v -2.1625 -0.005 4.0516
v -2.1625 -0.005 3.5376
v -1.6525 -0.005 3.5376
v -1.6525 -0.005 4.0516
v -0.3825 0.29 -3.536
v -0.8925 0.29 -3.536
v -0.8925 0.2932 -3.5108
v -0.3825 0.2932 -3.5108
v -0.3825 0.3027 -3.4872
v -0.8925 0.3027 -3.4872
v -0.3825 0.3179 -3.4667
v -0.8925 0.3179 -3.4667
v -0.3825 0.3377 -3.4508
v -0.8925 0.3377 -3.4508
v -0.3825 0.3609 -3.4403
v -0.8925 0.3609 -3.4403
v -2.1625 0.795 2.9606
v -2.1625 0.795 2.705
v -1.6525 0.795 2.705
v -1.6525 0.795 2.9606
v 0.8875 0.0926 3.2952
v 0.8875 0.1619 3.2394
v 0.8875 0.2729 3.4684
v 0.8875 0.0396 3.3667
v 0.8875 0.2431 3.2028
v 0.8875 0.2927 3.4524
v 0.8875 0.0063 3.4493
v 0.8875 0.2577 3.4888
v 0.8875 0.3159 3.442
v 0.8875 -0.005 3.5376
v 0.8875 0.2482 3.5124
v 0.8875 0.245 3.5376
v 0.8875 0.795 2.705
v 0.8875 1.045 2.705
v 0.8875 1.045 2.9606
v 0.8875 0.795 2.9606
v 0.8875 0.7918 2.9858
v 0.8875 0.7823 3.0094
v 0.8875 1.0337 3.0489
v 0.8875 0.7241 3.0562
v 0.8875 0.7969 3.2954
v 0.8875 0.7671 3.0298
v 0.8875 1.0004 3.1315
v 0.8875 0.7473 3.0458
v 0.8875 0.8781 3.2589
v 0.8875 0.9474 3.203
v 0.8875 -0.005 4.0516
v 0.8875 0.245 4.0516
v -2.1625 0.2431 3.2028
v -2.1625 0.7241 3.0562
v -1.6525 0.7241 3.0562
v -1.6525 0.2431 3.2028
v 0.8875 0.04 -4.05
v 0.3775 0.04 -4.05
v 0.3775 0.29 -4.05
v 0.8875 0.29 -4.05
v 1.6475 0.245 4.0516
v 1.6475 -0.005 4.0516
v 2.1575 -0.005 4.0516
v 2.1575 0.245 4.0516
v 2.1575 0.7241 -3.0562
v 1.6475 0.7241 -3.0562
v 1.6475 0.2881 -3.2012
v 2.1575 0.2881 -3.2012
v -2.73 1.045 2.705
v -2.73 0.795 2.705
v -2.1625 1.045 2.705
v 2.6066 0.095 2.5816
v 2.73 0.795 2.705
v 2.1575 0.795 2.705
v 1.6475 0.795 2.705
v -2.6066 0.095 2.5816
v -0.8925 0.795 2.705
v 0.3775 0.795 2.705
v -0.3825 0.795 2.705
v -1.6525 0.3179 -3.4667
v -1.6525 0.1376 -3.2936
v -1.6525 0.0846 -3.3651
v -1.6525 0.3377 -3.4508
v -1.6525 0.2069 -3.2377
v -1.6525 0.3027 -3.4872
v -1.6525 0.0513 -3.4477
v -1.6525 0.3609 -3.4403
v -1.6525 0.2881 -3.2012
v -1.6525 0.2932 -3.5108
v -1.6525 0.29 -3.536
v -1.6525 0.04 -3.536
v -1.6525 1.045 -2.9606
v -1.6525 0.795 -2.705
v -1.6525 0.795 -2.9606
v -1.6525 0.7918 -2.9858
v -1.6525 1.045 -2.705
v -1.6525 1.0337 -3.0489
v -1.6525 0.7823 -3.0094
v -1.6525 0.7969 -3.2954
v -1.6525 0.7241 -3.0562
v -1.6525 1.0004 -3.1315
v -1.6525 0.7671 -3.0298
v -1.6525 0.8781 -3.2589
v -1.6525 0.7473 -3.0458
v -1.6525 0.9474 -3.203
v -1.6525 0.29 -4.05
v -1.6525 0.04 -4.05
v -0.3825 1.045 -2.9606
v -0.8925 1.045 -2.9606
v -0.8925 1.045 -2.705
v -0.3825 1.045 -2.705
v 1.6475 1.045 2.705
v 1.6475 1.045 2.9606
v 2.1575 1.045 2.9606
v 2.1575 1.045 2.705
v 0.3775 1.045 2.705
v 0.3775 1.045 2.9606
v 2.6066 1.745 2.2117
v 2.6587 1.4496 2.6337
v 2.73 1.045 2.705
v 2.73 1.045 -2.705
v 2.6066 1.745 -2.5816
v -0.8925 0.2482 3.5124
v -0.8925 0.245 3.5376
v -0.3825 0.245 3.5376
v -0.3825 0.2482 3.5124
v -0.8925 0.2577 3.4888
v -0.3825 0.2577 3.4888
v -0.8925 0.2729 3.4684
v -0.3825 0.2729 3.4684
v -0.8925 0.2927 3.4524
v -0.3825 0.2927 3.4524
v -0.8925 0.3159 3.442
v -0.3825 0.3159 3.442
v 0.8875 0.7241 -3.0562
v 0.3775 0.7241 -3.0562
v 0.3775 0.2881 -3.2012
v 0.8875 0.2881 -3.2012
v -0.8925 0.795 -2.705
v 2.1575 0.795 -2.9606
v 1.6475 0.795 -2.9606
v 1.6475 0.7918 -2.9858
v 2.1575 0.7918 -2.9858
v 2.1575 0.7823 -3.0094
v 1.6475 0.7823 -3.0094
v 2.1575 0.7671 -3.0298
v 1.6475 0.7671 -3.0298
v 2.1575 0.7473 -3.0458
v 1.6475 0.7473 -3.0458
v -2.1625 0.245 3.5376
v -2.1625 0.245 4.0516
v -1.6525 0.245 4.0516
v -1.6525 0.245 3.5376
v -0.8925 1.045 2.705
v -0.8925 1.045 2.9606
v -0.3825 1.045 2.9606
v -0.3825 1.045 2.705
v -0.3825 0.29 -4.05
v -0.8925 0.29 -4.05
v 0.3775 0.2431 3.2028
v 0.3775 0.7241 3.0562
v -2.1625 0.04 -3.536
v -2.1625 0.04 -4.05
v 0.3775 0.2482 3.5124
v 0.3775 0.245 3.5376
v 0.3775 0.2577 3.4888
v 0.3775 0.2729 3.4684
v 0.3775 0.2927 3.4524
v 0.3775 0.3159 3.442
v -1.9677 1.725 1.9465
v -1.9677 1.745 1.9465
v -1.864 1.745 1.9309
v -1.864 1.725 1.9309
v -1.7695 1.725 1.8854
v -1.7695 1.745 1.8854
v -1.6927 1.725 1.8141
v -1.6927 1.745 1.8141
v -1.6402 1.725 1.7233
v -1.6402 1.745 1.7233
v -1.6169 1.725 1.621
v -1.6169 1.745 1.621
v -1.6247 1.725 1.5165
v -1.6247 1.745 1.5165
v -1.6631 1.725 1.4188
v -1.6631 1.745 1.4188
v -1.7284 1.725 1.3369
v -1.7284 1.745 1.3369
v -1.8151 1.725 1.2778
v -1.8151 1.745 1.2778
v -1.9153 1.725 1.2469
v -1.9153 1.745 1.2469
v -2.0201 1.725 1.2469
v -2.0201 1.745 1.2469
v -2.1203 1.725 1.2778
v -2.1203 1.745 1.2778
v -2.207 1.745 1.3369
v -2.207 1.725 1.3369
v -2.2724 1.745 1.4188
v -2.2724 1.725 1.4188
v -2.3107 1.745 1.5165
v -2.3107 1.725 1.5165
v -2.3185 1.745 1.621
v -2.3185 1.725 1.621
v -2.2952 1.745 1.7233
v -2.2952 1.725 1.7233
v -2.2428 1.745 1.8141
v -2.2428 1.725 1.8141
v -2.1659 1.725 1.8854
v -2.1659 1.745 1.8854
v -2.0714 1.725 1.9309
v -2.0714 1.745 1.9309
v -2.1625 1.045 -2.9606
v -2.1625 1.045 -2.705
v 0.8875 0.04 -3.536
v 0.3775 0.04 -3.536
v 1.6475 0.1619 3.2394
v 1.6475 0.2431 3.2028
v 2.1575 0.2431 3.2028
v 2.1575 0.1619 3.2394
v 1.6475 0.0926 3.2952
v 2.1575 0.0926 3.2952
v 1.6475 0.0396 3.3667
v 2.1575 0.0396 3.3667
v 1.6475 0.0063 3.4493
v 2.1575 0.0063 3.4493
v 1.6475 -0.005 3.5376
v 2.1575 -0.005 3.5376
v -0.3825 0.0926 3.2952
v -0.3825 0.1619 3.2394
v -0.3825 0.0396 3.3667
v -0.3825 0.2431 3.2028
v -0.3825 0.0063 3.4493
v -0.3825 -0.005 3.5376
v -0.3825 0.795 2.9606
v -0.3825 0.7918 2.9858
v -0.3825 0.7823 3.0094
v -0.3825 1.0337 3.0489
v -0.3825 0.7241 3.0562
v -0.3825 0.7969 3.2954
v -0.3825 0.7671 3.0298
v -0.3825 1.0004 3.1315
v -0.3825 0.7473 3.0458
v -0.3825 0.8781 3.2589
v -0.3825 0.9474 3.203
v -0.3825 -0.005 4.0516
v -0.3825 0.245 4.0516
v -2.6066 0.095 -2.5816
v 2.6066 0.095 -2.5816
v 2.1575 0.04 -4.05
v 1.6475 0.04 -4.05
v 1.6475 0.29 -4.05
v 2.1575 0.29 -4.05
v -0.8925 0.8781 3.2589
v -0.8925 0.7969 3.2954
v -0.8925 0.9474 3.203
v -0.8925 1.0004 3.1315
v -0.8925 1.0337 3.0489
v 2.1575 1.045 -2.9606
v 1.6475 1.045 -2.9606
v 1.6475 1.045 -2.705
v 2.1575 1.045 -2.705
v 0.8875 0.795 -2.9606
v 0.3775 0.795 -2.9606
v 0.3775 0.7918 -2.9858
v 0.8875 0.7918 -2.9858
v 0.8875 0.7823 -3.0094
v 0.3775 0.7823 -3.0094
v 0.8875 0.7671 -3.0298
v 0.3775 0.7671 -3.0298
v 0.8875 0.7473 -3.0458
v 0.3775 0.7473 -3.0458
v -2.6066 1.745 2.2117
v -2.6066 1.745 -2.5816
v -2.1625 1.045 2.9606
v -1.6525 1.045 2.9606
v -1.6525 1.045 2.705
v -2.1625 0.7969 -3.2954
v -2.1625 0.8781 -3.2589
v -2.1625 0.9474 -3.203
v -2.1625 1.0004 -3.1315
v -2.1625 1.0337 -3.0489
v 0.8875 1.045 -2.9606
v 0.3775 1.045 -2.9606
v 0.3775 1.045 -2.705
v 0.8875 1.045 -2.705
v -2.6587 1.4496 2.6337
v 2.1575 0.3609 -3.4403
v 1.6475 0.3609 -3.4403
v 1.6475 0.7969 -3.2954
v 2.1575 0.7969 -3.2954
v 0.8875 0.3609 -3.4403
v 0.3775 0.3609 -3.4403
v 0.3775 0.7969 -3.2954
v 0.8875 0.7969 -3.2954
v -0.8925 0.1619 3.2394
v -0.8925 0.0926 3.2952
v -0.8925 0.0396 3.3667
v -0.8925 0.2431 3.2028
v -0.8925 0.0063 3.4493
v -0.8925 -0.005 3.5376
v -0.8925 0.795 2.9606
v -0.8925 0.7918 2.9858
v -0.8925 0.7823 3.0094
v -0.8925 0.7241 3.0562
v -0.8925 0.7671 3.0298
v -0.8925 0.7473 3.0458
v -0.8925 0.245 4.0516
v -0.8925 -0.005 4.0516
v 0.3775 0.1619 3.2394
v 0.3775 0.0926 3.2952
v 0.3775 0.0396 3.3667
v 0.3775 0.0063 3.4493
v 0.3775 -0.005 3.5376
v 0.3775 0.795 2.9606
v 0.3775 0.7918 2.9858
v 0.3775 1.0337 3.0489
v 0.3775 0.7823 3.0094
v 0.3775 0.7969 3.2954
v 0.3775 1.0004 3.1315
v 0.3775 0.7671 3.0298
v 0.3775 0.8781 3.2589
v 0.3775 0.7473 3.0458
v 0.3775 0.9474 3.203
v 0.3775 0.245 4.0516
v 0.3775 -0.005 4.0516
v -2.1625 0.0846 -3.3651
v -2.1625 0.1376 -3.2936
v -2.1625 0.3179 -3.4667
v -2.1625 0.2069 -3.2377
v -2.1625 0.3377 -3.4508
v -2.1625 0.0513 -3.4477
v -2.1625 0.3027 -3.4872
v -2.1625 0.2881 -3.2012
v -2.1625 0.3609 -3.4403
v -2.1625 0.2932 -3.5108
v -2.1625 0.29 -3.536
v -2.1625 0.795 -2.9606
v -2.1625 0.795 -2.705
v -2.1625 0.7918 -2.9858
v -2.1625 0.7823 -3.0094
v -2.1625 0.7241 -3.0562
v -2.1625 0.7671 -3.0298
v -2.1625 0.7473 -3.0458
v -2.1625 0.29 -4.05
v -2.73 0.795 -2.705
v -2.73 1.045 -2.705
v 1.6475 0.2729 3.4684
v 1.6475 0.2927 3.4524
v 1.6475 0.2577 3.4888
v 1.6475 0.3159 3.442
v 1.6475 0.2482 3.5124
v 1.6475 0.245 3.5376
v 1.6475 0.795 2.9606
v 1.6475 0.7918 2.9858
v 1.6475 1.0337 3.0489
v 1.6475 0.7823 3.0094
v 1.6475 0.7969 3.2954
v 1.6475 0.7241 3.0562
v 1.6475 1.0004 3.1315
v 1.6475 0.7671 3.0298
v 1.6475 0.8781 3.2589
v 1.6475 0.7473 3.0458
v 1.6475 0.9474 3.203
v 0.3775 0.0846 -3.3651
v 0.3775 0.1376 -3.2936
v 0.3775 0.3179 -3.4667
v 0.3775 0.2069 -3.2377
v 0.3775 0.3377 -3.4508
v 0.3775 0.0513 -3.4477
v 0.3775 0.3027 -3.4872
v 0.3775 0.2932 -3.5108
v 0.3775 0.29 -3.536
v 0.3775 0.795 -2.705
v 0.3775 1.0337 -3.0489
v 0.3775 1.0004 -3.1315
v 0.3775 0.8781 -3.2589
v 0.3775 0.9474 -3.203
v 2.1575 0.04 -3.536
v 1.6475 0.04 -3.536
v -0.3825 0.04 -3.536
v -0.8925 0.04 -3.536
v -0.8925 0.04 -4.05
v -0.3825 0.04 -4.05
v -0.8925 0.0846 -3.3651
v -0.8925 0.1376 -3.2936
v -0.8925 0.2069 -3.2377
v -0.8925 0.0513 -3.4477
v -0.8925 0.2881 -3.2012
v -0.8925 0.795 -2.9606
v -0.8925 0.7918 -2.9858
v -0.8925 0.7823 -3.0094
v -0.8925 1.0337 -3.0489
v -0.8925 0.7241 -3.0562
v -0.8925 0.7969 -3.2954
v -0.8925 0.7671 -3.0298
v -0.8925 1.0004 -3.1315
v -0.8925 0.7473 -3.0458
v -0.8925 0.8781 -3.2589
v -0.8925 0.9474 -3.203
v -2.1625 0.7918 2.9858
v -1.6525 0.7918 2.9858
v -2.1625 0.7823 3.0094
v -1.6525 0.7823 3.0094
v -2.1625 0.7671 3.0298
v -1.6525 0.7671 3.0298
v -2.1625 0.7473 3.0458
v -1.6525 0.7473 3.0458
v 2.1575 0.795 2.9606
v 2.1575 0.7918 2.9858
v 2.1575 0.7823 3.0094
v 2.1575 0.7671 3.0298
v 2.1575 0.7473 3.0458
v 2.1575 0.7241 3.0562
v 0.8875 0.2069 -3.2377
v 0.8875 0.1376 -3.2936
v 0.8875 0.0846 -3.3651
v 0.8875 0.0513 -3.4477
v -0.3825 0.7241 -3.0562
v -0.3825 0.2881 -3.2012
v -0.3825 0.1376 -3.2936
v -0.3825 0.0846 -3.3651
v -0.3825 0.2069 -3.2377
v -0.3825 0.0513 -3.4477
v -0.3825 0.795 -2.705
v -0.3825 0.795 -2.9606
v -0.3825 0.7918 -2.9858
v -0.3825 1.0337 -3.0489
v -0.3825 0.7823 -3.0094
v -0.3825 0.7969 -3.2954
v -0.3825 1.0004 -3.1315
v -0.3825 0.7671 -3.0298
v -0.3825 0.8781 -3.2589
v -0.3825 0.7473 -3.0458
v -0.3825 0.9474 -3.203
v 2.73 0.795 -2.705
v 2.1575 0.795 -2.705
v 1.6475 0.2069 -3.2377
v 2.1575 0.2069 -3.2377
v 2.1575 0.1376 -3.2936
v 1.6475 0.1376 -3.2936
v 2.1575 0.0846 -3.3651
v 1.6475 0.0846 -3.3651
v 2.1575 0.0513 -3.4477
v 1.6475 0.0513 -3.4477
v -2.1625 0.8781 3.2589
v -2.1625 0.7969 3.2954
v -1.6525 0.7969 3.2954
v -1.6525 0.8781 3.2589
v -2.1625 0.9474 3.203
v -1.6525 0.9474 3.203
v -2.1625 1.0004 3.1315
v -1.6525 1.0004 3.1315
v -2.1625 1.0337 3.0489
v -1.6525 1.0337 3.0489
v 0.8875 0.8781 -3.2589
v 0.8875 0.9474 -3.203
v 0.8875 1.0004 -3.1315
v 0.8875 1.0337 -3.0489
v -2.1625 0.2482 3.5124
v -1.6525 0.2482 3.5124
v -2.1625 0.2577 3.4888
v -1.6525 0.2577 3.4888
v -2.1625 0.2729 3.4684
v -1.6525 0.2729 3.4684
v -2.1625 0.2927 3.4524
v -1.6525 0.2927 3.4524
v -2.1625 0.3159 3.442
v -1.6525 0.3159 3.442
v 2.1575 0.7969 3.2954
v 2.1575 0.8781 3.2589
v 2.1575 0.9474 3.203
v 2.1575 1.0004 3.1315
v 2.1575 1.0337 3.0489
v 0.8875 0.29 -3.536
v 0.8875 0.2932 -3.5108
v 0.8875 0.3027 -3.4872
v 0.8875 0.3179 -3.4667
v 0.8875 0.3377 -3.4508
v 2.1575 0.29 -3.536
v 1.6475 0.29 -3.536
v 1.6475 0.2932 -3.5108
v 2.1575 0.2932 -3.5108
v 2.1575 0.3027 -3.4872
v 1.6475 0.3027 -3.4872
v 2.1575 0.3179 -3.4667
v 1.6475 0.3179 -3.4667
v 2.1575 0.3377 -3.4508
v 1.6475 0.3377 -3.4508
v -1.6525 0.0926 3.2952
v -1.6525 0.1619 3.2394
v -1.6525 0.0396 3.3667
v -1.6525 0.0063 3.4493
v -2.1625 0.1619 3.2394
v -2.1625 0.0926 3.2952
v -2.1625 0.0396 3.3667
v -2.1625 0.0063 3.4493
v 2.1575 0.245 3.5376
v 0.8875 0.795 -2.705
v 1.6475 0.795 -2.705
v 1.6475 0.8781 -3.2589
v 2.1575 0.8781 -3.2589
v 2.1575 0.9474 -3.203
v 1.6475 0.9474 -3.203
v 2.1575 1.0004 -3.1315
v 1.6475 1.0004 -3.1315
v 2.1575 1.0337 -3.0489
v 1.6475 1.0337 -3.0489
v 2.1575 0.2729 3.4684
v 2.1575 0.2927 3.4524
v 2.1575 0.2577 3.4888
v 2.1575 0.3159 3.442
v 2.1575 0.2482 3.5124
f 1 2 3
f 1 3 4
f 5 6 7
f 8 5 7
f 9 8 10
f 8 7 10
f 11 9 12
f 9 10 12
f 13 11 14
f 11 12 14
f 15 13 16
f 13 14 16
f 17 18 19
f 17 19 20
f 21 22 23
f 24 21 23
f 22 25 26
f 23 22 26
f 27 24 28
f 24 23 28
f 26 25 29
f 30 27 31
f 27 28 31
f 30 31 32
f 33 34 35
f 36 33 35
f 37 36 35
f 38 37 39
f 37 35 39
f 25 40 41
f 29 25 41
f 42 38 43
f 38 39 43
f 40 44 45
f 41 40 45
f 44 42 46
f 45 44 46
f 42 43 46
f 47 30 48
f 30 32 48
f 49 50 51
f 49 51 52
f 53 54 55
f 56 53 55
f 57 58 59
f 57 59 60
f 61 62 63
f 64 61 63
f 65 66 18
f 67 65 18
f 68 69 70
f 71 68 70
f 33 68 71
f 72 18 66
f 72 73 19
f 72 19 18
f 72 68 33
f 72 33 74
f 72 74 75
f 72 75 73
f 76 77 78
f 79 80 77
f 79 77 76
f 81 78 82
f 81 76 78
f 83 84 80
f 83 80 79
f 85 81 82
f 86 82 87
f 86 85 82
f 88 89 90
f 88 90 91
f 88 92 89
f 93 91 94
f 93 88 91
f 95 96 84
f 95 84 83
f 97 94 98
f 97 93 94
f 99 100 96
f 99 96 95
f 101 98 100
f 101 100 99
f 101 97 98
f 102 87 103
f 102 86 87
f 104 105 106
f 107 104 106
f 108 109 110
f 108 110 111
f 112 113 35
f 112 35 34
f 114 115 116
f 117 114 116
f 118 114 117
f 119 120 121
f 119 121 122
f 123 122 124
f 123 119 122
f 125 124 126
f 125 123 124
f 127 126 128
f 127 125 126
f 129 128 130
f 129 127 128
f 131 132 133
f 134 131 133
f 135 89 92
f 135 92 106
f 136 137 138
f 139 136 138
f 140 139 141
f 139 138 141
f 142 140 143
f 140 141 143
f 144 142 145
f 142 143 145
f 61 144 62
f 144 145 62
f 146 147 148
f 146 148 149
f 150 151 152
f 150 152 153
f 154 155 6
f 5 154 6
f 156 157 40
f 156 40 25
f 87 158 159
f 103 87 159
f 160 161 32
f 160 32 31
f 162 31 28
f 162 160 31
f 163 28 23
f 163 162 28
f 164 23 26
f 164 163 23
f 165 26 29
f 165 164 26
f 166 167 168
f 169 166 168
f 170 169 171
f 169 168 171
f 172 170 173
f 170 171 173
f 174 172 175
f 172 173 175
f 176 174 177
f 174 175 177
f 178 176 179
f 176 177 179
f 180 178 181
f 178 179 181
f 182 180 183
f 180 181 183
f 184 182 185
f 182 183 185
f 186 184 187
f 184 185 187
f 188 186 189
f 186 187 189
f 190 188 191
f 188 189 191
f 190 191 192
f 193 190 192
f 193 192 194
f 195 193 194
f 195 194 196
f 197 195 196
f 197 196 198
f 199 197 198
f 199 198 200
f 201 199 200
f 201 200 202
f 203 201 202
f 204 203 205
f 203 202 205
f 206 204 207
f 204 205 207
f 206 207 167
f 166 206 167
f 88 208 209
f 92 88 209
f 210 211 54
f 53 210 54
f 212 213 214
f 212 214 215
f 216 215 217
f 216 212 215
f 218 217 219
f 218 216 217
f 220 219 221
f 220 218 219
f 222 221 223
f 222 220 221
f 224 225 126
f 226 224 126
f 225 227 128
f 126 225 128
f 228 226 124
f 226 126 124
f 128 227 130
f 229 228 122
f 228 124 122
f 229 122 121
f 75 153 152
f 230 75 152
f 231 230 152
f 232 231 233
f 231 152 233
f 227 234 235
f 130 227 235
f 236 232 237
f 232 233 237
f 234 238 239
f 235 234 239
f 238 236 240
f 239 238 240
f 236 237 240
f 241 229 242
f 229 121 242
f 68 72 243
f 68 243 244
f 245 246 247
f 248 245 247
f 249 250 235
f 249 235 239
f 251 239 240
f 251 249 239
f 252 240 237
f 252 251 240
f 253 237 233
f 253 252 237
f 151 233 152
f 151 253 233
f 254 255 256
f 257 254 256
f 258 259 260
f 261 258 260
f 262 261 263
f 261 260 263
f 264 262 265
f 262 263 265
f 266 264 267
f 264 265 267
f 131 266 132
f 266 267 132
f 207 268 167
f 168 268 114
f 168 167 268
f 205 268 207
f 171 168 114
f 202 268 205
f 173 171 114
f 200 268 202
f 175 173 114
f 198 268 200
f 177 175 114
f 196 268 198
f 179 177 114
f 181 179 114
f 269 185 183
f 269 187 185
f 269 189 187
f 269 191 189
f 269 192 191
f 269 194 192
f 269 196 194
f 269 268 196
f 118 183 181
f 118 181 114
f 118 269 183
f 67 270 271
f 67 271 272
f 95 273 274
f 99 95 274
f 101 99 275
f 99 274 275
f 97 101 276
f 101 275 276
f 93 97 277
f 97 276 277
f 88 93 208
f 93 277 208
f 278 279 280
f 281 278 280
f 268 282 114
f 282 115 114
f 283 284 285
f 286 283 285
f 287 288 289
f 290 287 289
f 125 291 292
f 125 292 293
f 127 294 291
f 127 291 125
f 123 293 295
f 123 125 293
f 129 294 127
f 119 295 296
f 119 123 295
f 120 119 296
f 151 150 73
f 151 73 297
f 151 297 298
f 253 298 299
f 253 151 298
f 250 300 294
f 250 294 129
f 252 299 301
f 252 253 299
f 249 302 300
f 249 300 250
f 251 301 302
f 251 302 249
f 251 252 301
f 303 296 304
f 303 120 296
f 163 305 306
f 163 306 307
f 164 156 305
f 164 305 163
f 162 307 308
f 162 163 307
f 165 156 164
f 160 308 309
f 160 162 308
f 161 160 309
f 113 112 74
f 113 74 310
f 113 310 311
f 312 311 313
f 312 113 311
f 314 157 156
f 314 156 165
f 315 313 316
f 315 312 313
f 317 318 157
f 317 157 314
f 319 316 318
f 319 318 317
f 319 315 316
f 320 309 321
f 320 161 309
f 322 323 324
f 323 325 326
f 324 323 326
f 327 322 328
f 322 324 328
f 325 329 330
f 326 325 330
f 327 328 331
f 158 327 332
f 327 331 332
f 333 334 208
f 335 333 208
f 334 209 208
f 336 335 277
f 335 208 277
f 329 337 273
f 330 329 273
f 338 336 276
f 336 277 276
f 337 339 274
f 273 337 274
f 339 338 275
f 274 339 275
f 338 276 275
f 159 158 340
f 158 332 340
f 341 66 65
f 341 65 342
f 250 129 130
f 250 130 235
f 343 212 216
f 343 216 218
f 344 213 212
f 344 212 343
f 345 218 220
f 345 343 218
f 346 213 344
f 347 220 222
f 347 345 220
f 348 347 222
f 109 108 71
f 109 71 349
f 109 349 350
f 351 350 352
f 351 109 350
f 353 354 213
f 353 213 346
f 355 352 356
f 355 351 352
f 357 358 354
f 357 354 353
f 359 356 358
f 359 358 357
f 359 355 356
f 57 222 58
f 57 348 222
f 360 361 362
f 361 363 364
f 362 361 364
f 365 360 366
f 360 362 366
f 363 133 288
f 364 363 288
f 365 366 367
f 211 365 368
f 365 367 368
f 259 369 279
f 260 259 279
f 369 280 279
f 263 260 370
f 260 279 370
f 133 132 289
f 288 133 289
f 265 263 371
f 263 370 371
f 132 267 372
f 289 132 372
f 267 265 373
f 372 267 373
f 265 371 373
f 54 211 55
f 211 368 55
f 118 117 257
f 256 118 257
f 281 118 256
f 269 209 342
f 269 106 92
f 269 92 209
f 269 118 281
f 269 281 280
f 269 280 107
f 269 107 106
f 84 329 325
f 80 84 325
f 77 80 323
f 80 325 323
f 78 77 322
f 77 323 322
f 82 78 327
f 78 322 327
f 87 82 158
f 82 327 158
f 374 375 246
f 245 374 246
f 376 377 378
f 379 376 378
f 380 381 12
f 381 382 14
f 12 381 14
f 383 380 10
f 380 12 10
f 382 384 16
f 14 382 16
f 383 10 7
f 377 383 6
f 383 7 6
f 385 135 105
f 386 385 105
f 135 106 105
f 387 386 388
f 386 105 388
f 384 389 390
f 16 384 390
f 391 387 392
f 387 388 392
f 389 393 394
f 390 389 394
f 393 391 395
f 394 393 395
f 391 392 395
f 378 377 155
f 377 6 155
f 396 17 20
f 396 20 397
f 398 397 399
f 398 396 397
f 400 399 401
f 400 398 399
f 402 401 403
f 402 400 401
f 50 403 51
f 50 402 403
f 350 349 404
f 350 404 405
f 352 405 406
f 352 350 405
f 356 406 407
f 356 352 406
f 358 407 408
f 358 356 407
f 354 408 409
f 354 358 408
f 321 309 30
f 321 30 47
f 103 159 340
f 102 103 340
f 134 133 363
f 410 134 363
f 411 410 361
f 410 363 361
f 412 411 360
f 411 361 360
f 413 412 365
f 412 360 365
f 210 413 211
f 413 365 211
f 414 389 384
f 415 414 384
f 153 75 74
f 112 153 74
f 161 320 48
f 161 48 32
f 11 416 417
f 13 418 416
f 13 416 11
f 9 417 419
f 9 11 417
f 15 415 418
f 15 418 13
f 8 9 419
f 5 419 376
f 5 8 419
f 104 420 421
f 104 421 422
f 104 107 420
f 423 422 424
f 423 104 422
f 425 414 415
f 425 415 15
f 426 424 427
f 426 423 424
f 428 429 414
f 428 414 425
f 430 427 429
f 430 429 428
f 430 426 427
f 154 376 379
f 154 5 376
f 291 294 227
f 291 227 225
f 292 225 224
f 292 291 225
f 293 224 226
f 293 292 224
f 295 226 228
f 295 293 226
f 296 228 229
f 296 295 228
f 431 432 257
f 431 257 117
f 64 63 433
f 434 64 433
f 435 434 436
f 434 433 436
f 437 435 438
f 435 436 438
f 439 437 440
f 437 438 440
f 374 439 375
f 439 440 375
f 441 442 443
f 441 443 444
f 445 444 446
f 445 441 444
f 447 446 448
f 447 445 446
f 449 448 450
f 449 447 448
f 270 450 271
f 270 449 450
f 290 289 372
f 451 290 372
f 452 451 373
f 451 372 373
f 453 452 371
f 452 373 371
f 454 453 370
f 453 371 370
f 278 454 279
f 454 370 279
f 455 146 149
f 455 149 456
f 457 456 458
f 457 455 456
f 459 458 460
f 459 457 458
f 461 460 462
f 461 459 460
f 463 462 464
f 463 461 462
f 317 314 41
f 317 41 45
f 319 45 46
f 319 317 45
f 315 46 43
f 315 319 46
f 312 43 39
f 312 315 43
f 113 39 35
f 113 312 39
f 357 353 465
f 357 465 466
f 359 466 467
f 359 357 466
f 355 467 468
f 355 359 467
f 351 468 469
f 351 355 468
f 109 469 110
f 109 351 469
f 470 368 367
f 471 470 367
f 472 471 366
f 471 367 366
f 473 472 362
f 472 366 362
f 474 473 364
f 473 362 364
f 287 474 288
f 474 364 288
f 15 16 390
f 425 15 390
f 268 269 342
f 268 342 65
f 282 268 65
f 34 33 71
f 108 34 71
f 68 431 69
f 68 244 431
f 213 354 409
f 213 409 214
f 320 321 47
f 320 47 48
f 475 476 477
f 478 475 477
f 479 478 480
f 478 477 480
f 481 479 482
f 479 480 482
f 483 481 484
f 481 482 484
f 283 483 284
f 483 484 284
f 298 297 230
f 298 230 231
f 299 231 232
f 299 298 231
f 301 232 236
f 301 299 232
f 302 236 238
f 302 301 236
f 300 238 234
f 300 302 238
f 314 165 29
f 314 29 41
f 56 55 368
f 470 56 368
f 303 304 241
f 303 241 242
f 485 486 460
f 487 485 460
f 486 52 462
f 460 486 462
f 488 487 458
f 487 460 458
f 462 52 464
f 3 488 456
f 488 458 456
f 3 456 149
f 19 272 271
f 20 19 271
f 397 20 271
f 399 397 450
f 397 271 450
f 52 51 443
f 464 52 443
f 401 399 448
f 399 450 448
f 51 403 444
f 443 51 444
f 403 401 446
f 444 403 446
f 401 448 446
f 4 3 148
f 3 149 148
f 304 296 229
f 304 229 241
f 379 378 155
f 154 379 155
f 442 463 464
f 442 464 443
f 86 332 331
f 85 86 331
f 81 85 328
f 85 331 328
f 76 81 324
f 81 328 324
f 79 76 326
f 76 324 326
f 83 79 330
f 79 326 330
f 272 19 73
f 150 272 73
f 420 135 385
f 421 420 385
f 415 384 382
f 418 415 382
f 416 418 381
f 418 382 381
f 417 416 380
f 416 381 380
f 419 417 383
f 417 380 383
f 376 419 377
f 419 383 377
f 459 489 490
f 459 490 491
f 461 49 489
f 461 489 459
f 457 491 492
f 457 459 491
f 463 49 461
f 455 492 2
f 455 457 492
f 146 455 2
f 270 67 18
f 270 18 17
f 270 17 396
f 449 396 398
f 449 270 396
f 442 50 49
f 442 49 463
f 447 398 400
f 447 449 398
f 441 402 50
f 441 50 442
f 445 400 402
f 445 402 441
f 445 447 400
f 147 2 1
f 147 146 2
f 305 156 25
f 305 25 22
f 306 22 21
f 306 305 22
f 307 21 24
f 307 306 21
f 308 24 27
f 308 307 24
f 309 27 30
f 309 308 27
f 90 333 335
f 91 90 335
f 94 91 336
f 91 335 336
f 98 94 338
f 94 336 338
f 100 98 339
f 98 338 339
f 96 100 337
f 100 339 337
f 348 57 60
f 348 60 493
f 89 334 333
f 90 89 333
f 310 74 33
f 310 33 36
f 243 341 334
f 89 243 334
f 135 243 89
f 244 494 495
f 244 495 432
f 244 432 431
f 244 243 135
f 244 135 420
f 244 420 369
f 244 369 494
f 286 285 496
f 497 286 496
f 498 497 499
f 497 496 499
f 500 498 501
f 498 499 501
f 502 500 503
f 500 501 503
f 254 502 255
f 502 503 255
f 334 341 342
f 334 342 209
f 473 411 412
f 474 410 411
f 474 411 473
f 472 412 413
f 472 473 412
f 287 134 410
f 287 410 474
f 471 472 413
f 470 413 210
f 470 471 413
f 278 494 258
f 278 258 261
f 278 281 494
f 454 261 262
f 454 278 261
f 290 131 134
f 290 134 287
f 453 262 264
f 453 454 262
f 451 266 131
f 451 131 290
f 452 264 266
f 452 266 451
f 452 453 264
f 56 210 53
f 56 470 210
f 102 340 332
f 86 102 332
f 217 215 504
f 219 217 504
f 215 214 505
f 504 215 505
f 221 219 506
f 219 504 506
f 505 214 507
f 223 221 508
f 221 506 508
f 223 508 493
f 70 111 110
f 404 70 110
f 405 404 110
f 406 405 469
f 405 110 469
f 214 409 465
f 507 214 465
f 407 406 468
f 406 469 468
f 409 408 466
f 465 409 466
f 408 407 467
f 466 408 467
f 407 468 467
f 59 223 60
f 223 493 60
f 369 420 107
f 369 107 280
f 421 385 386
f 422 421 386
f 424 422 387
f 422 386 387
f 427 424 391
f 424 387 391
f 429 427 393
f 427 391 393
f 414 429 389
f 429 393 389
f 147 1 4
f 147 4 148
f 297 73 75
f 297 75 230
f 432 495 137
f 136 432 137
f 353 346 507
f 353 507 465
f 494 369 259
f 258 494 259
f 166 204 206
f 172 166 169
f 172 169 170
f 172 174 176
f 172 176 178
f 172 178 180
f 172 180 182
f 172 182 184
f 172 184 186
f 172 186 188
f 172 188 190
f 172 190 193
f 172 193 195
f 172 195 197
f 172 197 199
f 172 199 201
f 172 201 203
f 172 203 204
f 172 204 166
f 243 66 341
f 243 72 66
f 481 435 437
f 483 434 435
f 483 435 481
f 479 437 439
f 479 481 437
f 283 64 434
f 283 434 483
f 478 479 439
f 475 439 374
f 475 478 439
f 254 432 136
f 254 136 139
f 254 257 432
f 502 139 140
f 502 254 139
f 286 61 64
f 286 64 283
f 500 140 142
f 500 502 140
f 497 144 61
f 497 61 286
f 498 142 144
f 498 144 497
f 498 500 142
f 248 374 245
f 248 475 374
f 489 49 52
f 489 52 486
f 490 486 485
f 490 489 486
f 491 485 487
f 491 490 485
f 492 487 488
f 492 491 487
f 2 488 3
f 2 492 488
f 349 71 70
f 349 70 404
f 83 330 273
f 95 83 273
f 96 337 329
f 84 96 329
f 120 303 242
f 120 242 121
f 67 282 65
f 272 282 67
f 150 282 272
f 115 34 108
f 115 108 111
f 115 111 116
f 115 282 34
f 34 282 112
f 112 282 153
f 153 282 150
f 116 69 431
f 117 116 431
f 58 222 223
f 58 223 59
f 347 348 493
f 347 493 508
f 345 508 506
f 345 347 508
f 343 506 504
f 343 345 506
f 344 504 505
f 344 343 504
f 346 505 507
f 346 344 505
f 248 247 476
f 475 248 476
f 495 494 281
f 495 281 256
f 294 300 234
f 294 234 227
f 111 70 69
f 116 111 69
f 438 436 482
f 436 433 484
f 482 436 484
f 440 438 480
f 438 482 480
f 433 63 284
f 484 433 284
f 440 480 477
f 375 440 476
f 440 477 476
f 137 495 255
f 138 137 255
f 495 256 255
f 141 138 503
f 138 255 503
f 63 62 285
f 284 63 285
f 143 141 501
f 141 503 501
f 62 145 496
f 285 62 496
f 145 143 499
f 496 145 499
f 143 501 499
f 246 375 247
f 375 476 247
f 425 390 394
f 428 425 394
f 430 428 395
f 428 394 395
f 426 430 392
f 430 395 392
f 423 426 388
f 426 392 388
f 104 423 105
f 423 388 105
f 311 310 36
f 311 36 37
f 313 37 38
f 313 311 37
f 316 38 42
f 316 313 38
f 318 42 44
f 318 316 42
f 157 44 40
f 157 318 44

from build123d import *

# Parameters (mm, degrees)
BOSS_EXTRUDE1_DEPTH      = 0.125
BOSS_EXTRUDE1_DEPTH_BACK = 0.125
SKETCH1_W                = 5.46
SKETCH1_H                = 5.41
SKETCH2_W                = 5.46
SKETCH2_H                = 5.41
BOSS_EXTRUDE2_DEPTH      = 0.7
BOSS_EXTRUDE2_TAPER      = 10
SKETCH3_W                = 5.46
SKETCH3_H                = 5.41
BOSS_EXTRUDE3_DEPTH      = 0.7
BOSS_EXTRUDE3_TAPER      = 10
CHAMFER1_SIZE            = 0.3
CHAMFER1_SIZE2           = 0.369840916
BOSS_EXTRUDE4_START      = 0.3775
BOSS_EXTRUDE4_DEPTH      = 0.51
LPATTERN1_COUNT          = 2
LPATTERN1_PITCH          = 1.27
LPATTERN1_COL_COUNT      = 3
LPATTERN1_COL_PITCH      = 1.27
SKETCH6_R                = 0.351785146
CUT_EXTRUDE1_DEPTH       = 0.02


with BuildPart() as part:
    # Sketch1 → Boss-Extrude1 (new, two sides: drawn at the far end of the back side and taken through both)
    with BuildSketch(Plane(origin=(0, 0.92, 0), x_dir=(1, 0, 0), z_dir=(0, 1, 0)).offset(-BOSS_EXTRUDE1_DEPTH_BACK)):
        Rectangle(SKETCH1_W, SKETCH1_H)
    extrude(amount=BOSS_EXTRUDE1_DEPTH + BOSS_EXTRUDE1_DEPTH_BACK)

    # Sketch2 → Boss-Extrude2 (add)
    with BuildSketch(Plane(origin=(0, 1.045, 0), x_dir=(1, 0, 0), z_dir=(0, 1, 0))):
        Rectangle(SKETCH2_W, SKETCH2_H)
    extrude(amount=BOSS_EXTRUDE2_DEPTH, taper=BOSS_EXTRUDE2_TAPER)

    # Sketch3 → Boss-Extrude3 (add)
    with BuildSketch(Plane.XZ.offset(-0.795)):
        Rectangle(SKETCH3_W, SKETCH3_H)
    extrude(amount=BOSS_EXTRUDE3_DEPTH, taper=BOSS_EXTRUDE3_TAPER)

    # Chamfer1
    chamfer1_edges = [part.edges().sort_by_distance(p)[0] for p in [
        (0, 1.745, 2.581571114),
    ]]
    chamfer1_side = [part.faces().sort_by_distance(p)[0] for p in [
        (0, 1.392301631, 2.643761352),
    ]]
    chamfer(chamfer1_edges, length=CHAMFER1_SIZE, length2=CHAMFER1_SIZE2, reference=chamfer1_side[0])

    # Sketch5 → Boss-Extrude4 (add)
    with BuildSketch(Plane(origin=(0, 0, 0), x_dir=(0, 0, -1), z_dir=(1, 0, 0)).offset(BOSS_EXTRUDE4_START)):
        with BuildLine():
            ThreePointArc((-3.20280312, 0.243081155), (-3.329274491, 0.063778027), (-3.537635241, -0.005))
            Line((-3.537635241, -0.005), (-4.051646267, -0.005))
            Line((-4.051646267, -0.005), (-4.051646267, 0.245))
            Line((-4.051646267, 0.245), (-3.537635241, 0.245))
            ThreePointArc((-3.537635241, 0.245), (-3.478103598, 0.264650865), (-3.441968921, 0.31588033))
            Line((-3.441968921, 0.31588033), (-3.295422291, 0.796918845))
            ThreePointArc((-3.295422291, 0.796918845), (-3.168950919, 0.976221974), (-2.960590167, 1.045000002))
            Line((-2.960590167, 1.045000002), (-2.704999997, 1.045000002))
            Line((-2.704999997, 1.045000002), (-2.704999997, 0.794999999))
            Line((-2.704999997, 0.794999999), (-2.960590167, 0.794999999))
            ThreePointArc((-2.960590167, 0.794999999), (-3.020112307, 0.775356174), (-3.056249597, 0.724142296))
            Line((-3.056249597, 0.724142296), (-3.20280312, 0.243081155))
        make_face()
        with BuildLine():
            Line((2.704999997, 0.794999999), (2.960590167, 0.794999999))
            ThreePointArc((2.960590167, 0.794999999), (3.020112307, 0.775356174), (3.056249597, 0.724142296))
            Line((3.056249597, 0.724142296), (3.201156853, 0.288081155))
            ThreePointArc((3.201156853, 0.288081155), (3.327628224, 0.108778027), (3.535988974, 0.04))
            Line((3.535988974, 0.04), (4.05, 0.04))
            Line((4.05, 0.04), (4.05, 0.29))
            Line((4.05, 0.29), (3.535988974, 0.29))
            ThreePointArc((3.535988974, 0.29), (3.476457331, 0.309650865), (3.440322653, 0.36088033))
            Line((3.440322653, 0.36088033), (3.295422291, 0.796918845))
            ThreePointArc((3.295422291, 0.796918845), (3.168950919, 0.976221974), (2.960590167, 1.045000002))
            Line((2.960590167, 1.045000002), (2.704999997, 1.045000002))
            Line((2.704999997, 1.045000002), (2.704999997, 0.794999999))
        make_face()
    boss_extrude4 = extrude(amount=BOSS_EXTRUDE4_DEPTH)

    # LPattern1: Boss-Extrude4 ×2
    with Locations(*[(i * LPATTERN1_PITCH, 0, 0) for i in range(1, LPATTERN1_COUNT)]):
        add(boss_extrude4)

    # LPattern1 col: Boss-Extrude4 ×3
    with Locations(*[(-i * LPATTERN1_COL_PITCH, 0, 0) for i in range(1, LPATTERN1_COL_COUNT)]):
        add(boss_extrude4)

    # Sketch6 → Cut-Extrude1 (cut)
    with BuildSketch(Plane(origin=(0, 1.745, 0), x_dir=(1, 0, 0), z_dir=(0, 1, 0))):
        with Locations(Location((-1.967714846, -1.59473048, 0), (0, 0, 270))):
            Circle(SKETCH6_R)
    extrude(amount=-CUT_EXTRUDE1_DEPTH, mode=Mode.SUBTRACT)


solid = part.part
